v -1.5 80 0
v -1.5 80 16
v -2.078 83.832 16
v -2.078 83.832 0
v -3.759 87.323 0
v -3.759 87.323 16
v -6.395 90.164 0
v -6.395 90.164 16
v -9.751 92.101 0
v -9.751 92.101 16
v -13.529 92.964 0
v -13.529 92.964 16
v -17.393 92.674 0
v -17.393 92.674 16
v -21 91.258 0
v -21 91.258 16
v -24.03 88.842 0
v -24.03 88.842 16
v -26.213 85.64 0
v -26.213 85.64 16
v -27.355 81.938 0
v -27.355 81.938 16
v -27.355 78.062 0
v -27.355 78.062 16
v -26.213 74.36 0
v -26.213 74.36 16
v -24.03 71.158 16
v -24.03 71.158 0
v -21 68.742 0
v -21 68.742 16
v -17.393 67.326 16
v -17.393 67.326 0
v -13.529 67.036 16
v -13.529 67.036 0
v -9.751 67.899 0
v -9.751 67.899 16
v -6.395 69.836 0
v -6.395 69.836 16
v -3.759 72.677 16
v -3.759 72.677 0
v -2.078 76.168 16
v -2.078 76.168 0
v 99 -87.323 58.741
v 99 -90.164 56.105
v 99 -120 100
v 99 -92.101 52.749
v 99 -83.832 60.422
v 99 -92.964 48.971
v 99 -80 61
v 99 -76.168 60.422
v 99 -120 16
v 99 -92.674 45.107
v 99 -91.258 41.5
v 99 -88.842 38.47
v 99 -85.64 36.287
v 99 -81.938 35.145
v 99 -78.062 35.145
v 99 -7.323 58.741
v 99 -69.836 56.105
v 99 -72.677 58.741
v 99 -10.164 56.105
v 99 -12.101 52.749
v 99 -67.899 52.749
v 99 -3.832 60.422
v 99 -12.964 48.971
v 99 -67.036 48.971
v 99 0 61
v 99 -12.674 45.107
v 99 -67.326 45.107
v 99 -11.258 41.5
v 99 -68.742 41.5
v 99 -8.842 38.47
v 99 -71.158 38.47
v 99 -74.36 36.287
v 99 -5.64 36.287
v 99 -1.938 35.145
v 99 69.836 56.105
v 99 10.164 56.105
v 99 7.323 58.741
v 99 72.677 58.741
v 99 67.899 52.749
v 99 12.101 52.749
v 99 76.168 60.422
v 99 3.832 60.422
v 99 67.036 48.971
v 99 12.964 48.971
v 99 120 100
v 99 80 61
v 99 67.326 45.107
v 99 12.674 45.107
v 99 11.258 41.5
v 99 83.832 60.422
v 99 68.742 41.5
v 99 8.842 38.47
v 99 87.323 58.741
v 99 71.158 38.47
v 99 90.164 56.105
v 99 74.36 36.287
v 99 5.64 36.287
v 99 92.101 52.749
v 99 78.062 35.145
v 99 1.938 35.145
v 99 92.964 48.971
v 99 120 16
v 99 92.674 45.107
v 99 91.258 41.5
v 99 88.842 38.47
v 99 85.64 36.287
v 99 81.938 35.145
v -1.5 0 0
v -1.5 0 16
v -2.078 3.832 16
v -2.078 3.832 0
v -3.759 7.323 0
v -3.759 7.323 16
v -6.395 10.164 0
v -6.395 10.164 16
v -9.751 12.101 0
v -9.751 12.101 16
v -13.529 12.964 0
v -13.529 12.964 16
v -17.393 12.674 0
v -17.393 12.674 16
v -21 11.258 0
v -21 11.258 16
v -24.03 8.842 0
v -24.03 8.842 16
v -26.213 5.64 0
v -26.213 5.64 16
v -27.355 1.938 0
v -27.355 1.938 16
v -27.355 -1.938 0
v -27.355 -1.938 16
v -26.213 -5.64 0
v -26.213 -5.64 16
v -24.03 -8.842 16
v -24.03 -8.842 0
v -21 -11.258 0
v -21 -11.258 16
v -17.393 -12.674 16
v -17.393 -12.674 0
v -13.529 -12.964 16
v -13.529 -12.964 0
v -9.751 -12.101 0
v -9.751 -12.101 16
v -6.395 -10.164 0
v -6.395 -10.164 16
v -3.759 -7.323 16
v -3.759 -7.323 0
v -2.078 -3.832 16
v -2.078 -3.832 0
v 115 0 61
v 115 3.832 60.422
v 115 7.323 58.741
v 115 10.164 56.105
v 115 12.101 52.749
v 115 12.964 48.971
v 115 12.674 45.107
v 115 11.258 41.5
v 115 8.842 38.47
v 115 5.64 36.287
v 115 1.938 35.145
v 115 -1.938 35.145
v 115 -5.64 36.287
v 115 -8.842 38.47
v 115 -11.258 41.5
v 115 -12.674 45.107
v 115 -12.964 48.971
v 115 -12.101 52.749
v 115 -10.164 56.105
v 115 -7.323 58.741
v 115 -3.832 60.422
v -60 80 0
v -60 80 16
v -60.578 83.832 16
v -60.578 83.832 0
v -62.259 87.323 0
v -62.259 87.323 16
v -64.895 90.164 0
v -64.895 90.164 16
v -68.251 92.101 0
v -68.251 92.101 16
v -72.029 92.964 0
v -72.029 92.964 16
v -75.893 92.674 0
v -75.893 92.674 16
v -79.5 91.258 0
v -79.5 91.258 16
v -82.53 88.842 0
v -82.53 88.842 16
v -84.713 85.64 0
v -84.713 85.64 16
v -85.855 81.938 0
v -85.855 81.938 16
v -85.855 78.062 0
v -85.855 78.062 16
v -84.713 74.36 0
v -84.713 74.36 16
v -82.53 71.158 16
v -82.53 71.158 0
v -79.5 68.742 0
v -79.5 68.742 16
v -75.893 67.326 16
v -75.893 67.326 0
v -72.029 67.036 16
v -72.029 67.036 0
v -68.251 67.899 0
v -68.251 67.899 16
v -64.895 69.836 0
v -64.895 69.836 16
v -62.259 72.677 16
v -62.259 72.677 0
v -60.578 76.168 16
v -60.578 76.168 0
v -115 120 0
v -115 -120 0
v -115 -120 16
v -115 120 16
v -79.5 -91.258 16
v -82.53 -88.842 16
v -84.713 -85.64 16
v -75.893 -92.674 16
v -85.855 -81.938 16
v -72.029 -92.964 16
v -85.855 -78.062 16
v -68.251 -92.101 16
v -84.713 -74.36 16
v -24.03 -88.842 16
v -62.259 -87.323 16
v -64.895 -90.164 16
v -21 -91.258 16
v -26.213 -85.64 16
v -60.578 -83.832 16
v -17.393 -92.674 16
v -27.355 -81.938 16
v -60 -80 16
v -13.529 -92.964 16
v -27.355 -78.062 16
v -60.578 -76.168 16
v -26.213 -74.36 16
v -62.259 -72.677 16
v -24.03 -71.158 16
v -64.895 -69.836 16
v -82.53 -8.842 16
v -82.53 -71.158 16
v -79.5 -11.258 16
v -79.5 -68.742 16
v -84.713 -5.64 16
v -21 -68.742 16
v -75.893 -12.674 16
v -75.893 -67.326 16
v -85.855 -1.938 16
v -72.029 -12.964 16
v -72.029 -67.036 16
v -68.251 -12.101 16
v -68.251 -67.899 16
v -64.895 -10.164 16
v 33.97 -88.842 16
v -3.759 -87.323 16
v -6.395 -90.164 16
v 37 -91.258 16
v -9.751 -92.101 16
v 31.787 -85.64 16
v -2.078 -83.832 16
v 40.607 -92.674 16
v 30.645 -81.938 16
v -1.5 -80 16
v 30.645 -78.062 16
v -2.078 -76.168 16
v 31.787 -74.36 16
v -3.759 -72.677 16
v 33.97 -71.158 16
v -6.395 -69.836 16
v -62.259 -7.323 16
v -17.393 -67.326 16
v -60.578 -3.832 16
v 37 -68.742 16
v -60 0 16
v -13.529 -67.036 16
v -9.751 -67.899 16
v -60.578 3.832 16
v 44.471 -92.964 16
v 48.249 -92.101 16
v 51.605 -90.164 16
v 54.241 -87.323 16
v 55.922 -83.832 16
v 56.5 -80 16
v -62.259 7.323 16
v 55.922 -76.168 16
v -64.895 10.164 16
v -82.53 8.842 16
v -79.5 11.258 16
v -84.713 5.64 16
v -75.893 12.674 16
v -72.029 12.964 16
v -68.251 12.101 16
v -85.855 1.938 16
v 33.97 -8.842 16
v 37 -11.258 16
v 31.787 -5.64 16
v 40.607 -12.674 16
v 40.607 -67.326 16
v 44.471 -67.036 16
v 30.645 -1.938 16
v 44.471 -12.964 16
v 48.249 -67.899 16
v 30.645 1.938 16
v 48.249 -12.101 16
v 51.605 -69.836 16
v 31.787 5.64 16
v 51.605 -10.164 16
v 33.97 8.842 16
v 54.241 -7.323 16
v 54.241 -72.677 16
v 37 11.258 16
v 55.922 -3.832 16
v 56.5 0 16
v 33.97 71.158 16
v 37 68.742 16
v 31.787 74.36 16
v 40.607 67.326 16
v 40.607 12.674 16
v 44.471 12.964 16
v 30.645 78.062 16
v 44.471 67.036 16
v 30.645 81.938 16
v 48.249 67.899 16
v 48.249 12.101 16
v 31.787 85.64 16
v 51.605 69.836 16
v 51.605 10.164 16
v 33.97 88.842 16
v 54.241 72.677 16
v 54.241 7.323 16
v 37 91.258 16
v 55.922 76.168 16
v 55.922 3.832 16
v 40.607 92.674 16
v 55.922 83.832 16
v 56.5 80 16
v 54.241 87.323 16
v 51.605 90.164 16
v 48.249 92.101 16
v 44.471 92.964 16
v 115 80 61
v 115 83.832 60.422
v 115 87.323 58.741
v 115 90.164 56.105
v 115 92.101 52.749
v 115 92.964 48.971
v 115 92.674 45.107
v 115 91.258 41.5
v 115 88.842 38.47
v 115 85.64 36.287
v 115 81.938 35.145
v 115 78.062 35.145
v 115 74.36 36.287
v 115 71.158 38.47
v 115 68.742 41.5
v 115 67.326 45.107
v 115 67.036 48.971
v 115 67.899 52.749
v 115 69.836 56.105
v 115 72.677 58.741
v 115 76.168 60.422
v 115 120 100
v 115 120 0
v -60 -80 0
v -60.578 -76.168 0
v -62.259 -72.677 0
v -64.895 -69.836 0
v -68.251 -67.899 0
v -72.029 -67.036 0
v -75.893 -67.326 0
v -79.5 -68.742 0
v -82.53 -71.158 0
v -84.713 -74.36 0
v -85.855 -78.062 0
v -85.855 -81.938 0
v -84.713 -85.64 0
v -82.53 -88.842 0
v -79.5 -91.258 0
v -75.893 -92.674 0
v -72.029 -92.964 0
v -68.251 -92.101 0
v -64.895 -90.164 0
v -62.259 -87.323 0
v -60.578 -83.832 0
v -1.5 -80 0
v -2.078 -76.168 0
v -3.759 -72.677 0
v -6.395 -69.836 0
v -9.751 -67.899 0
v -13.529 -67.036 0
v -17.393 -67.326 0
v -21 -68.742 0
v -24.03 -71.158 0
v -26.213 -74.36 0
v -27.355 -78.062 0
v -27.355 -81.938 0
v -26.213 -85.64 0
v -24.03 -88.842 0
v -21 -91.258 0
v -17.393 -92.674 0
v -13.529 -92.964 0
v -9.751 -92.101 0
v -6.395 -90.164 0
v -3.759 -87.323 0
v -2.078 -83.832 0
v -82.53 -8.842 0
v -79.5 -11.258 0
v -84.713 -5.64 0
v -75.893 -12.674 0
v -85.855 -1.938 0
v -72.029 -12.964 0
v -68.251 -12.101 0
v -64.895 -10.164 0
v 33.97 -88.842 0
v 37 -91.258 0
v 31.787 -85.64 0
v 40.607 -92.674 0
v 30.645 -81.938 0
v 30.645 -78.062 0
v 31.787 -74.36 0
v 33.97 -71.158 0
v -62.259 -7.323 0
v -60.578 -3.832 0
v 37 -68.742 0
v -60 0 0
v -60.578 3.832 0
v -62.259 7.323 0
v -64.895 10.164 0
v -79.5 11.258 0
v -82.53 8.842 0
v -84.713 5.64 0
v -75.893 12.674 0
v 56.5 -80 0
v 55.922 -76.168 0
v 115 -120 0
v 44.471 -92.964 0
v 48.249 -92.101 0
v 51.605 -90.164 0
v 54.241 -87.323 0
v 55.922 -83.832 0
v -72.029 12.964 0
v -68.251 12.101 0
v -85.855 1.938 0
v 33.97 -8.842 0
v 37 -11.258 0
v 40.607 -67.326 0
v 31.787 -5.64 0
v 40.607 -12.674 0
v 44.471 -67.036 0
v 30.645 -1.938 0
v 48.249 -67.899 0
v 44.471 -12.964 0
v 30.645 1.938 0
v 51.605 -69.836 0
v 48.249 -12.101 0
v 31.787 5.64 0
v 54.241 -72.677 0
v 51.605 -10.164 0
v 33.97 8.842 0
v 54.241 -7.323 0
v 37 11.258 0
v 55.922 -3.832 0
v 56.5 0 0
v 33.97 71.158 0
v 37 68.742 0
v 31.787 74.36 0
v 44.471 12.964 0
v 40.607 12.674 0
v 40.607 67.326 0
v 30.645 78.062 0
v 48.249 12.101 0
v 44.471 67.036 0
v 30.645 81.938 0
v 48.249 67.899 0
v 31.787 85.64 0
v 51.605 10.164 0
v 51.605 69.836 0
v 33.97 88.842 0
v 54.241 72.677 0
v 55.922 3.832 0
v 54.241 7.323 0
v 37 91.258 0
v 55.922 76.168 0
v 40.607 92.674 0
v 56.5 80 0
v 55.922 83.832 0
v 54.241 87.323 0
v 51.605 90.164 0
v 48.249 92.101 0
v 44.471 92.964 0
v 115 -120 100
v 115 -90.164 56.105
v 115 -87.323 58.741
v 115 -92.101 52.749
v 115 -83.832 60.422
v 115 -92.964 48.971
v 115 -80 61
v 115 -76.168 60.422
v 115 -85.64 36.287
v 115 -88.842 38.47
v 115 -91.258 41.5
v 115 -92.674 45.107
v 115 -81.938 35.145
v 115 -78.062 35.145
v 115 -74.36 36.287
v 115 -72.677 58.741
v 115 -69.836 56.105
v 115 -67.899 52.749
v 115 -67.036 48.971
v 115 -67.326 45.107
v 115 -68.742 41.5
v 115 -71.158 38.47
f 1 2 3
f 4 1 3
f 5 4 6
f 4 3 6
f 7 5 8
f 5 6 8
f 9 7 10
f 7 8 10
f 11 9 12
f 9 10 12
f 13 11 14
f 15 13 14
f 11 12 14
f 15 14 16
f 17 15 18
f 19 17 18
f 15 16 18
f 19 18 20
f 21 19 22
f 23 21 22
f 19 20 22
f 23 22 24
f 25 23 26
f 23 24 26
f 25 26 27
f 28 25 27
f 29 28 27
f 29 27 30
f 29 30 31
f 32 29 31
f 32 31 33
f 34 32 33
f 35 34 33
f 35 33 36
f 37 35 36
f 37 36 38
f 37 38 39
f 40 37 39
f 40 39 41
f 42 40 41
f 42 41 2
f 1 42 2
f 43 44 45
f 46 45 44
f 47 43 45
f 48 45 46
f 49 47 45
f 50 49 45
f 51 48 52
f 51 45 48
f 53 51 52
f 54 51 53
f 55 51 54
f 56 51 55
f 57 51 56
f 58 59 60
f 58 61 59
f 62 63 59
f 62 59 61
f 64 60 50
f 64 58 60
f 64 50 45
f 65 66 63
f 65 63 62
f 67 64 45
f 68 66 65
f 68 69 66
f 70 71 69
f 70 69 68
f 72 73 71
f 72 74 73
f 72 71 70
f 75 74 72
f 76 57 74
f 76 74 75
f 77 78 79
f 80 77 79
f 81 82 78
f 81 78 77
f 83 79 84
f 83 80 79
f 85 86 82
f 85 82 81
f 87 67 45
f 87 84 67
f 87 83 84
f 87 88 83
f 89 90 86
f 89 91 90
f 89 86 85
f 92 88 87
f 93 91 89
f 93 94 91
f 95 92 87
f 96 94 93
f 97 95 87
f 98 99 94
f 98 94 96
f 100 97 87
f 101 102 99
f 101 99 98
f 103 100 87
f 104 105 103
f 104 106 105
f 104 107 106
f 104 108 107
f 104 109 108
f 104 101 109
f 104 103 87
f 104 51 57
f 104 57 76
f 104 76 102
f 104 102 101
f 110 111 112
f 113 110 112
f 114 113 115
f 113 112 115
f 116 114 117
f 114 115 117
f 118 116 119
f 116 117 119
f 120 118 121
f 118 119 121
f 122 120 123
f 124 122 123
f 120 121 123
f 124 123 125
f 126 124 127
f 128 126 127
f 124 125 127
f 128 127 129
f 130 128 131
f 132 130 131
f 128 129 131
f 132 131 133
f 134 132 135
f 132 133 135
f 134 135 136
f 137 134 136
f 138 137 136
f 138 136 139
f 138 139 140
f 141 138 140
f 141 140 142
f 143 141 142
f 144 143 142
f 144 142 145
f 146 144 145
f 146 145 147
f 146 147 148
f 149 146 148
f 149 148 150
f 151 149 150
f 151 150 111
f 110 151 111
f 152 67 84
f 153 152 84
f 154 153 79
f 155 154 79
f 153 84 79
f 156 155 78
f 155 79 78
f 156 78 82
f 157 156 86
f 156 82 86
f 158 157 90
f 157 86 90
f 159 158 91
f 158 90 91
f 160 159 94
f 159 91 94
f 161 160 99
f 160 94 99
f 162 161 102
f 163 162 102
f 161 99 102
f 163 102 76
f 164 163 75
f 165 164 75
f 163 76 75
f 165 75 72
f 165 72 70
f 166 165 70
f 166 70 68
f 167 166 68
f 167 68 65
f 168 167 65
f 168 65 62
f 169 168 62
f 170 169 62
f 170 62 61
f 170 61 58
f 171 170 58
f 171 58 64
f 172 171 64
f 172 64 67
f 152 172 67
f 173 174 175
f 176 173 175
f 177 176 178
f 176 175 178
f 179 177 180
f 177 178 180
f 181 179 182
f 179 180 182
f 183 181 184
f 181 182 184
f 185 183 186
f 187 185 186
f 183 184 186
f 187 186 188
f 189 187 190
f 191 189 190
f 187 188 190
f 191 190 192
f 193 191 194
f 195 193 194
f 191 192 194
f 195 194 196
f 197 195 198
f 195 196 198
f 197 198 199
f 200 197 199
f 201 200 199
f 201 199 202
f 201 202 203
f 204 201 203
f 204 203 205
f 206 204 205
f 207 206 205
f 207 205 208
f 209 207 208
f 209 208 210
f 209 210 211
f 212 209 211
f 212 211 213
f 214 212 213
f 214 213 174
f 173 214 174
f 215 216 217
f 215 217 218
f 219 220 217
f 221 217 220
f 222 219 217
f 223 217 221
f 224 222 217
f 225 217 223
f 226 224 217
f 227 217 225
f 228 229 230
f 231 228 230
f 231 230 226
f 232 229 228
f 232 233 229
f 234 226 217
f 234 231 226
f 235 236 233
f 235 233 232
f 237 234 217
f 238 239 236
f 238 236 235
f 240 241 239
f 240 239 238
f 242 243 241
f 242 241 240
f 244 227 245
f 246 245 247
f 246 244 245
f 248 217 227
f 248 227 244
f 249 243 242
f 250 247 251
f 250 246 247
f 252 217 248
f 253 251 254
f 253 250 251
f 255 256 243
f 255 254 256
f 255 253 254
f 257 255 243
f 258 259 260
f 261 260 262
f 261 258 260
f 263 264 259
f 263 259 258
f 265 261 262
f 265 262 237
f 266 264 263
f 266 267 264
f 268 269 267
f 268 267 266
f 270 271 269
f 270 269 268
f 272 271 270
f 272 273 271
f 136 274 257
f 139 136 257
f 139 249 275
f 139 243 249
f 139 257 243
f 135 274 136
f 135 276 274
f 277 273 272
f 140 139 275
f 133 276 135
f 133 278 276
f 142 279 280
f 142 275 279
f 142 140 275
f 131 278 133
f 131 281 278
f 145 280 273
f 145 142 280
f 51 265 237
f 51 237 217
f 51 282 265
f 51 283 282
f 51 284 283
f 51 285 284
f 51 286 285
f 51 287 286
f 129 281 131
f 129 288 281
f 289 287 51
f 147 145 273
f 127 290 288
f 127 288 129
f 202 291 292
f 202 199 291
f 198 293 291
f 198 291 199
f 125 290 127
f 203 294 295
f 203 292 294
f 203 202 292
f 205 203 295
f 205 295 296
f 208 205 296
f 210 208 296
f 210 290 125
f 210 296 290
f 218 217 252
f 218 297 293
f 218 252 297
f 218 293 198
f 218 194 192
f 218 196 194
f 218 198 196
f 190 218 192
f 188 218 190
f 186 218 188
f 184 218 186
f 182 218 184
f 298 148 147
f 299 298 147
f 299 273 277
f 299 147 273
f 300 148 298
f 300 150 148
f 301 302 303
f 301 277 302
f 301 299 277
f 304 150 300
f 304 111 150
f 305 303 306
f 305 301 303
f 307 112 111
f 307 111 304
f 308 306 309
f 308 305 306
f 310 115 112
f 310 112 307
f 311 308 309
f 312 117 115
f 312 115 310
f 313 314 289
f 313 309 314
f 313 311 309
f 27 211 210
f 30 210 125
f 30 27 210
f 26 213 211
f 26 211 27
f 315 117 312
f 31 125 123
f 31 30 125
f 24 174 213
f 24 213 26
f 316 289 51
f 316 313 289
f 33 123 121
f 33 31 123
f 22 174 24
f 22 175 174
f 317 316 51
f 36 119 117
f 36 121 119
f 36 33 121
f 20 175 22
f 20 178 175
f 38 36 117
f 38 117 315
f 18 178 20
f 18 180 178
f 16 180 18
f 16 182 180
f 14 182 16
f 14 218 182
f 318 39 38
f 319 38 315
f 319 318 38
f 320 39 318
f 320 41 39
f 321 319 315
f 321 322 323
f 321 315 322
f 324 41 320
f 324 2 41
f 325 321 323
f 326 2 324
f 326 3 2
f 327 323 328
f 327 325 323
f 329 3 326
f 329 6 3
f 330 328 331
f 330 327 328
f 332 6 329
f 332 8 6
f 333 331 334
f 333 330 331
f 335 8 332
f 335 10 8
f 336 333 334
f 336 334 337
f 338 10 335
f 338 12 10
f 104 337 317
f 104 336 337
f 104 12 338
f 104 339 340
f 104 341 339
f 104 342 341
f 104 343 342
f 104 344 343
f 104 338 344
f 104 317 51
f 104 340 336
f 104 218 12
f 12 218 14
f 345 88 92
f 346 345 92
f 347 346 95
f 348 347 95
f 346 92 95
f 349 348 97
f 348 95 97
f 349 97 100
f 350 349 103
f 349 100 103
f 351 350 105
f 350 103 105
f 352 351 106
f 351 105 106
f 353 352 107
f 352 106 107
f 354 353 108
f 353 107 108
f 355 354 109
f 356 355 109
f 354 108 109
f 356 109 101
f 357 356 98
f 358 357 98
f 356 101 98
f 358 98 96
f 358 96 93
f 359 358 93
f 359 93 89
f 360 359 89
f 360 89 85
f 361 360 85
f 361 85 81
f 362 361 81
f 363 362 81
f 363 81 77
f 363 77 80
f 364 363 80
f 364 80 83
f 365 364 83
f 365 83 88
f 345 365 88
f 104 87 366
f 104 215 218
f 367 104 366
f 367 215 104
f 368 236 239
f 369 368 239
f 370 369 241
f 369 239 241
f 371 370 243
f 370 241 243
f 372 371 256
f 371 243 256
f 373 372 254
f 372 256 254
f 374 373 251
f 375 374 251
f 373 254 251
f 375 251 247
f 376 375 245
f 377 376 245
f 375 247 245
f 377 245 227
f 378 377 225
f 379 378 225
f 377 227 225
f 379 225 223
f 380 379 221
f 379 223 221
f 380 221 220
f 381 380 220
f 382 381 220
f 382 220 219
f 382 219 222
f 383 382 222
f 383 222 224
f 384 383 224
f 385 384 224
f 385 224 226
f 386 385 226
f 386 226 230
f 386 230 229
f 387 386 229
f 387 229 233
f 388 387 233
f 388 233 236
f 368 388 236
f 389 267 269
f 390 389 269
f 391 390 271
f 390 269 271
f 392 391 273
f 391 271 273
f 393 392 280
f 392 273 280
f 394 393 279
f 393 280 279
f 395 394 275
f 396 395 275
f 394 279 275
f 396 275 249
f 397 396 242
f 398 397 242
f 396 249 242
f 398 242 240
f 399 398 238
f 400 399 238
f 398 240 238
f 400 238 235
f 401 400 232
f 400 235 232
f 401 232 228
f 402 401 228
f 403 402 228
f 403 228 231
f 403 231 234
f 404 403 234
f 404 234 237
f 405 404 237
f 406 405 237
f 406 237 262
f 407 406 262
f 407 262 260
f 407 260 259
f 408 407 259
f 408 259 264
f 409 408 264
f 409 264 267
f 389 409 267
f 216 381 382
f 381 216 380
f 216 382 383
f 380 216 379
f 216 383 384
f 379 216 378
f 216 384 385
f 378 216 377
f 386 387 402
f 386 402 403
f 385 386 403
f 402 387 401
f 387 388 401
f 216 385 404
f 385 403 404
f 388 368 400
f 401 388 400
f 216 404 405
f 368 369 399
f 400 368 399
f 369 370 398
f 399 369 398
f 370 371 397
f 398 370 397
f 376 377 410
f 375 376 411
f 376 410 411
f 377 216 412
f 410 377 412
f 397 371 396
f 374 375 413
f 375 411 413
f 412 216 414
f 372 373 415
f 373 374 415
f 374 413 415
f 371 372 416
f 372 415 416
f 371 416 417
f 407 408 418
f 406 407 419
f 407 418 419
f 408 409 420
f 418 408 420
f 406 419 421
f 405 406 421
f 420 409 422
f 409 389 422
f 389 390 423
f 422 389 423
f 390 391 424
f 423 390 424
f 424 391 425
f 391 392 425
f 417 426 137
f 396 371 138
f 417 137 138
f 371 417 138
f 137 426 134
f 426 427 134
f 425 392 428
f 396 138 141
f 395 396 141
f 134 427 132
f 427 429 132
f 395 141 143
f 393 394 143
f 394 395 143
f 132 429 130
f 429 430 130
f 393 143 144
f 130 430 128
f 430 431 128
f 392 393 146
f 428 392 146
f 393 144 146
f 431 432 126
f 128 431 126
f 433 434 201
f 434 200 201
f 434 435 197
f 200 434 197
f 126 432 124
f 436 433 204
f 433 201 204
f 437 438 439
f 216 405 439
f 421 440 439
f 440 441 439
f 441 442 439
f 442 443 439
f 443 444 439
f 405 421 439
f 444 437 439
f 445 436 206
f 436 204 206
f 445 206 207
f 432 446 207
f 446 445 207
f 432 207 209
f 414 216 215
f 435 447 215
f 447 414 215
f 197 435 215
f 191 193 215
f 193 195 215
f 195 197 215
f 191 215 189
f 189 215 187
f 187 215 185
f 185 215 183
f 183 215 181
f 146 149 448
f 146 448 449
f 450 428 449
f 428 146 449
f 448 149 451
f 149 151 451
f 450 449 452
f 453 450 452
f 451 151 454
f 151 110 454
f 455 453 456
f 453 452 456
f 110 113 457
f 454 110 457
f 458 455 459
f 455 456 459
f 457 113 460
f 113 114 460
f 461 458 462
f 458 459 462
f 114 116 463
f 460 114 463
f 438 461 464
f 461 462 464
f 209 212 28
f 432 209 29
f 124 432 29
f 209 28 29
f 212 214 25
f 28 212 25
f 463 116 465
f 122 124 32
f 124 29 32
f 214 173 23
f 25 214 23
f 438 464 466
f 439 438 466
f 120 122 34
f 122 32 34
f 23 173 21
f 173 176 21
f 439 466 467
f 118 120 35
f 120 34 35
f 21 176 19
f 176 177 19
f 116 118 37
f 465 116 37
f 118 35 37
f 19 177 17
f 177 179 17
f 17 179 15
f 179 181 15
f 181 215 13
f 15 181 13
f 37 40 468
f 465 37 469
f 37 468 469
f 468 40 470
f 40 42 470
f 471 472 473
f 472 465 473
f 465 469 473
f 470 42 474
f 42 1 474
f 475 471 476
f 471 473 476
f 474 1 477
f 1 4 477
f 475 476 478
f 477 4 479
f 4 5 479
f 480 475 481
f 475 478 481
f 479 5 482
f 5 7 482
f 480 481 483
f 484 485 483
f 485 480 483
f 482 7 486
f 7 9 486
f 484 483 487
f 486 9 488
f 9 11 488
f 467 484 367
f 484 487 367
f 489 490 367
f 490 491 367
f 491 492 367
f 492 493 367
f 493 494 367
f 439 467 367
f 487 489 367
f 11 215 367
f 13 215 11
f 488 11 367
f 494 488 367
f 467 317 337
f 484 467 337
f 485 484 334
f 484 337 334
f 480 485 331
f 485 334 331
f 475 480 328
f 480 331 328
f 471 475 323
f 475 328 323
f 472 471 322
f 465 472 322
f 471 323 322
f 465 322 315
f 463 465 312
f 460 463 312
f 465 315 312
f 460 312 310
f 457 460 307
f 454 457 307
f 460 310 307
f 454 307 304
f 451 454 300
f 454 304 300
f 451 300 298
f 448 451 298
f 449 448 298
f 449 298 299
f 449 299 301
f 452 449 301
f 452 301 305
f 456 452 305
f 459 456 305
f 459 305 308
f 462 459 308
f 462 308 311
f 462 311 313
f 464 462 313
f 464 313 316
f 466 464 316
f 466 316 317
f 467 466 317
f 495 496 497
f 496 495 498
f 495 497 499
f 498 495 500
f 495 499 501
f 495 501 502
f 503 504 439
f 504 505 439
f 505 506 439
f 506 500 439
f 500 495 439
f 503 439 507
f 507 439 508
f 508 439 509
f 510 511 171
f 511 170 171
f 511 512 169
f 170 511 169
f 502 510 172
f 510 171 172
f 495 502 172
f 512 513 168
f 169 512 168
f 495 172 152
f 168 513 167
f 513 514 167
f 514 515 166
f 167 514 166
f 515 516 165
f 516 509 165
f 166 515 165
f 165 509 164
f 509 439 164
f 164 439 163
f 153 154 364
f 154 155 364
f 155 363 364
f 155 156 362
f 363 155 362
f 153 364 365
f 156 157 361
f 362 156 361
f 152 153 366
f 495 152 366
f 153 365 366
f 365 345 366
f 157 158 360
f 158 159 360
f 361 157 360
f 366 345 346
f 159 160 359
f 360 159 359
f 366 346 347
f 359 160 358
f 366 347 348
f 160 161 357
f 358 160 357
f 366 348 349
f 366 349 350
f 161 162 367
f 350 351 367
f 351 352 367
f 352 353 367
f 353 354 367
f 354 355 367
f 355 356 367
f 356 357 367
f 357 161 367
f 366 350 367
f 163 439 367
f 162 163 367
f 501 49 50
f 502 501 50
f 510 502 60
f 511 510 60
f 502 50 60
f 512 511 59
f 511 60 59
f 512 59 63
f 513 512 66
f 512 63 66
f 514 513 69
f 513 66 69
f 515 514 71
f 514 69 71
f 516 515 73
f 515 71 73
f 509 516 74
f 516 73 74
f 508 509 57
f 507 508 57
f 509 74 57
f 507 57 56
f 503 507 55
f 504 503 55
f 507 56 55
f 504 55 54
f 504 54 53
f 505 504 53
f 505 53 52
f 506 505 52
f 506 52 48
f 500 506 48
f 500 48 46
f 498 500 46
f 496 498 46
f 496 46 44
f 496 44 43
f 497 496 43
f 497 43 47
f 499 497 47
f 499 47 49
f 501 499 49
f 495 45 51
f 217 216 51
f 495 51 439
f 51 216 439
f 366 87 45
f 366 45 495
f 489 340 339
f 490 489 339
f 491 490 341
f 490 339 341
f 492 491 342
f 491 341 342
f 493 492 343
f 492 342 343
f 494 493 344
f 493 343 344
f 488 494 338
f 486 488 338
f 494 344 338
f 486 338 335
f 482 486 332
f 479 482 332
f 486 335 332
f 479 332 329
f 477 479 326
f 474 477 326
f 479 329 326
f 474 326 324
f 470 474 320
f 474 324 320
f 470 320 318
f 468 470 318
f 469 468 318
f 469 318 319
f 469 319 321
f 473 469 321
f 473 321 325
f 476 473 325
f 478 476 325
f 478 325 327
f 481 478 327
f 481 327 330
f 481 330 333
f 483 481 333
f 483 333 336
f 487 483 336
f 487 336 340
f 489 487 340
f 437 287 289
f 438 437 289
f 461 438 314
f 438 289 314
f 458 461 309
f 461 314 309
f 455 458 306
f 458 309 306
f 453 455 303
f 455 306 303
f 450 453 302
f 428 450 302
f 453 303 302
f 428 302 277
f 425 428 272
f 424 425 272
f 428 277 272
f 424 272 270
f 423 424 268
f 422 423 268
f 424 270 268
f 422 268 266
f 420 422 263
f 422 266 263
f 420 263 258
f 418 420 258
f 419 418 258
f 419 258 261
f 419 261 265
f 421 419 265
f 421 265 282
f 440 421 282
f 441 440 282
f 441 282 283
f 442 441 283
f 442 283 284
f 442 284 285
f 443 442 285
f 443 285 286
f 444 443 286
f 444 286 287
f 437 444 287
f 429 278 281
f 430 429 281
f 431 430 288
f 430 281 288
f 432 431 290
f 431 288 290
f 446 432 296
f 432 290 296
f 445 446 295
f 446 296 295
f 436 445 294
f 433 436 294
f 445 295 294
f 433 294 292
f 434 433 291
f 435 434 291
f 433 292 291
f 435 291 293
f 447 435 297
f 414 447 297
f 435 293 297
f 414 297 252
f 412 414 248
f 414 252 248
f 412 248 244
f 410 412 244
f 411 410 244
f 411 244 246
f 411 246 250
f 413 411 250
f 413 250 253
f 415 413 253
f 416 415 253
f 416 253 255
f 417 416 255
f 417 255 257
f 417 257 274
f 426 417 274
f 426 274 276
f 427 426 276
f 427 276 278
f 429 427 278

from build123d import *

# Parameters (mm, degrees)
SKETCH_1_W             = 230
SKETCH_1_H             = 240
EXTRUDE_1_DEPTH        = 16
SKETCH_3_R             = 13
CUT_EXTRUDE_1_DEPTH    = 167.976046186
PATTERN_LINEAR_1_COUNT = 3
PATTERN_LINEAR_1_PITCH = 80
SKETCH_4_W             = 16
SKETCH_4_H             = 240
EXTRUDE_2_DEPTH        = 84
SKETCH_5_R             = 13
CUT_EXTRUDE_2_DEPTH    = 265.945277369
PATTERN_LINEAR_2_COUNT = 3
PATTERN_LINEAR_2_PITCH = 80


with BuildPart() as part:
    # 草图1 → 凸台-拉伸1 (new body)
    with BuildSketch(Plane.XY):
        Rectangle(SKETCH_1_W, SKETCH_1_H)
    extrude(amount=EXTRUDE_1_DEPTH)

    # 草图3 → 切除-拉伸1 (cut, through all)
    with BuildSketch(Plane.XY.offset(16)):
        with Locations((-73, 80)):
            Circle(SKETCH_3_R)
        with Locations((-14.5, 80)):
            Circle(SKETCH_3_R)
        with Locations((43.5, 80)):
            Circle(SKETCH_3_R)
    cut_extrude_1 = extrude(amount=-CUT_EXTRUDE_1_DEPTH, mode=Mode.SUBTRACT)

    # 阵列(线性)1: 切除-拉伸1 ×3
    with Locations(*[(0, -i * PATTERN_LINEAR_1_PITCH, 0) for i in range(1, PATTERN_LINEAR_1_COUNT)]):
        add(cut_extrude_1, mode=Mode.SUBTRACT)

    # 草图4 → 凸台-拉伸2 (add)
    with BuildSketch(Plane.XY.offset(16)):
        with Locations((107, 0)):
            Rectangle(SKETCH_4_W, SKETCH_4_H)
    extrude(amount=EXTRUDE_2_DEPTH)

    # 草图5 → 切除-拉伸2 (cut, through all)
    with BuildSketch(Plane.ZY.offset(-99)):
        with Locations((48, 80)):
            Circle(SKETCH_5_R)
    cut_extrude_2 = extrude(amount=-CUT_EXTRUDE_2_DEPTH, mode=Mode.SUBTRACT)

    # 阵列(线性)2: 切除-拉伸2 ×3
    with Locations(*[(0, -i * PATTERN_LINEAR_2_PITCH, 0) for i in range(1, PATTERN_LINEAR_2_COUNT)]):
        add(cut_extrude_2, mode=Mode.SUBTRACT)


solid = part.part
